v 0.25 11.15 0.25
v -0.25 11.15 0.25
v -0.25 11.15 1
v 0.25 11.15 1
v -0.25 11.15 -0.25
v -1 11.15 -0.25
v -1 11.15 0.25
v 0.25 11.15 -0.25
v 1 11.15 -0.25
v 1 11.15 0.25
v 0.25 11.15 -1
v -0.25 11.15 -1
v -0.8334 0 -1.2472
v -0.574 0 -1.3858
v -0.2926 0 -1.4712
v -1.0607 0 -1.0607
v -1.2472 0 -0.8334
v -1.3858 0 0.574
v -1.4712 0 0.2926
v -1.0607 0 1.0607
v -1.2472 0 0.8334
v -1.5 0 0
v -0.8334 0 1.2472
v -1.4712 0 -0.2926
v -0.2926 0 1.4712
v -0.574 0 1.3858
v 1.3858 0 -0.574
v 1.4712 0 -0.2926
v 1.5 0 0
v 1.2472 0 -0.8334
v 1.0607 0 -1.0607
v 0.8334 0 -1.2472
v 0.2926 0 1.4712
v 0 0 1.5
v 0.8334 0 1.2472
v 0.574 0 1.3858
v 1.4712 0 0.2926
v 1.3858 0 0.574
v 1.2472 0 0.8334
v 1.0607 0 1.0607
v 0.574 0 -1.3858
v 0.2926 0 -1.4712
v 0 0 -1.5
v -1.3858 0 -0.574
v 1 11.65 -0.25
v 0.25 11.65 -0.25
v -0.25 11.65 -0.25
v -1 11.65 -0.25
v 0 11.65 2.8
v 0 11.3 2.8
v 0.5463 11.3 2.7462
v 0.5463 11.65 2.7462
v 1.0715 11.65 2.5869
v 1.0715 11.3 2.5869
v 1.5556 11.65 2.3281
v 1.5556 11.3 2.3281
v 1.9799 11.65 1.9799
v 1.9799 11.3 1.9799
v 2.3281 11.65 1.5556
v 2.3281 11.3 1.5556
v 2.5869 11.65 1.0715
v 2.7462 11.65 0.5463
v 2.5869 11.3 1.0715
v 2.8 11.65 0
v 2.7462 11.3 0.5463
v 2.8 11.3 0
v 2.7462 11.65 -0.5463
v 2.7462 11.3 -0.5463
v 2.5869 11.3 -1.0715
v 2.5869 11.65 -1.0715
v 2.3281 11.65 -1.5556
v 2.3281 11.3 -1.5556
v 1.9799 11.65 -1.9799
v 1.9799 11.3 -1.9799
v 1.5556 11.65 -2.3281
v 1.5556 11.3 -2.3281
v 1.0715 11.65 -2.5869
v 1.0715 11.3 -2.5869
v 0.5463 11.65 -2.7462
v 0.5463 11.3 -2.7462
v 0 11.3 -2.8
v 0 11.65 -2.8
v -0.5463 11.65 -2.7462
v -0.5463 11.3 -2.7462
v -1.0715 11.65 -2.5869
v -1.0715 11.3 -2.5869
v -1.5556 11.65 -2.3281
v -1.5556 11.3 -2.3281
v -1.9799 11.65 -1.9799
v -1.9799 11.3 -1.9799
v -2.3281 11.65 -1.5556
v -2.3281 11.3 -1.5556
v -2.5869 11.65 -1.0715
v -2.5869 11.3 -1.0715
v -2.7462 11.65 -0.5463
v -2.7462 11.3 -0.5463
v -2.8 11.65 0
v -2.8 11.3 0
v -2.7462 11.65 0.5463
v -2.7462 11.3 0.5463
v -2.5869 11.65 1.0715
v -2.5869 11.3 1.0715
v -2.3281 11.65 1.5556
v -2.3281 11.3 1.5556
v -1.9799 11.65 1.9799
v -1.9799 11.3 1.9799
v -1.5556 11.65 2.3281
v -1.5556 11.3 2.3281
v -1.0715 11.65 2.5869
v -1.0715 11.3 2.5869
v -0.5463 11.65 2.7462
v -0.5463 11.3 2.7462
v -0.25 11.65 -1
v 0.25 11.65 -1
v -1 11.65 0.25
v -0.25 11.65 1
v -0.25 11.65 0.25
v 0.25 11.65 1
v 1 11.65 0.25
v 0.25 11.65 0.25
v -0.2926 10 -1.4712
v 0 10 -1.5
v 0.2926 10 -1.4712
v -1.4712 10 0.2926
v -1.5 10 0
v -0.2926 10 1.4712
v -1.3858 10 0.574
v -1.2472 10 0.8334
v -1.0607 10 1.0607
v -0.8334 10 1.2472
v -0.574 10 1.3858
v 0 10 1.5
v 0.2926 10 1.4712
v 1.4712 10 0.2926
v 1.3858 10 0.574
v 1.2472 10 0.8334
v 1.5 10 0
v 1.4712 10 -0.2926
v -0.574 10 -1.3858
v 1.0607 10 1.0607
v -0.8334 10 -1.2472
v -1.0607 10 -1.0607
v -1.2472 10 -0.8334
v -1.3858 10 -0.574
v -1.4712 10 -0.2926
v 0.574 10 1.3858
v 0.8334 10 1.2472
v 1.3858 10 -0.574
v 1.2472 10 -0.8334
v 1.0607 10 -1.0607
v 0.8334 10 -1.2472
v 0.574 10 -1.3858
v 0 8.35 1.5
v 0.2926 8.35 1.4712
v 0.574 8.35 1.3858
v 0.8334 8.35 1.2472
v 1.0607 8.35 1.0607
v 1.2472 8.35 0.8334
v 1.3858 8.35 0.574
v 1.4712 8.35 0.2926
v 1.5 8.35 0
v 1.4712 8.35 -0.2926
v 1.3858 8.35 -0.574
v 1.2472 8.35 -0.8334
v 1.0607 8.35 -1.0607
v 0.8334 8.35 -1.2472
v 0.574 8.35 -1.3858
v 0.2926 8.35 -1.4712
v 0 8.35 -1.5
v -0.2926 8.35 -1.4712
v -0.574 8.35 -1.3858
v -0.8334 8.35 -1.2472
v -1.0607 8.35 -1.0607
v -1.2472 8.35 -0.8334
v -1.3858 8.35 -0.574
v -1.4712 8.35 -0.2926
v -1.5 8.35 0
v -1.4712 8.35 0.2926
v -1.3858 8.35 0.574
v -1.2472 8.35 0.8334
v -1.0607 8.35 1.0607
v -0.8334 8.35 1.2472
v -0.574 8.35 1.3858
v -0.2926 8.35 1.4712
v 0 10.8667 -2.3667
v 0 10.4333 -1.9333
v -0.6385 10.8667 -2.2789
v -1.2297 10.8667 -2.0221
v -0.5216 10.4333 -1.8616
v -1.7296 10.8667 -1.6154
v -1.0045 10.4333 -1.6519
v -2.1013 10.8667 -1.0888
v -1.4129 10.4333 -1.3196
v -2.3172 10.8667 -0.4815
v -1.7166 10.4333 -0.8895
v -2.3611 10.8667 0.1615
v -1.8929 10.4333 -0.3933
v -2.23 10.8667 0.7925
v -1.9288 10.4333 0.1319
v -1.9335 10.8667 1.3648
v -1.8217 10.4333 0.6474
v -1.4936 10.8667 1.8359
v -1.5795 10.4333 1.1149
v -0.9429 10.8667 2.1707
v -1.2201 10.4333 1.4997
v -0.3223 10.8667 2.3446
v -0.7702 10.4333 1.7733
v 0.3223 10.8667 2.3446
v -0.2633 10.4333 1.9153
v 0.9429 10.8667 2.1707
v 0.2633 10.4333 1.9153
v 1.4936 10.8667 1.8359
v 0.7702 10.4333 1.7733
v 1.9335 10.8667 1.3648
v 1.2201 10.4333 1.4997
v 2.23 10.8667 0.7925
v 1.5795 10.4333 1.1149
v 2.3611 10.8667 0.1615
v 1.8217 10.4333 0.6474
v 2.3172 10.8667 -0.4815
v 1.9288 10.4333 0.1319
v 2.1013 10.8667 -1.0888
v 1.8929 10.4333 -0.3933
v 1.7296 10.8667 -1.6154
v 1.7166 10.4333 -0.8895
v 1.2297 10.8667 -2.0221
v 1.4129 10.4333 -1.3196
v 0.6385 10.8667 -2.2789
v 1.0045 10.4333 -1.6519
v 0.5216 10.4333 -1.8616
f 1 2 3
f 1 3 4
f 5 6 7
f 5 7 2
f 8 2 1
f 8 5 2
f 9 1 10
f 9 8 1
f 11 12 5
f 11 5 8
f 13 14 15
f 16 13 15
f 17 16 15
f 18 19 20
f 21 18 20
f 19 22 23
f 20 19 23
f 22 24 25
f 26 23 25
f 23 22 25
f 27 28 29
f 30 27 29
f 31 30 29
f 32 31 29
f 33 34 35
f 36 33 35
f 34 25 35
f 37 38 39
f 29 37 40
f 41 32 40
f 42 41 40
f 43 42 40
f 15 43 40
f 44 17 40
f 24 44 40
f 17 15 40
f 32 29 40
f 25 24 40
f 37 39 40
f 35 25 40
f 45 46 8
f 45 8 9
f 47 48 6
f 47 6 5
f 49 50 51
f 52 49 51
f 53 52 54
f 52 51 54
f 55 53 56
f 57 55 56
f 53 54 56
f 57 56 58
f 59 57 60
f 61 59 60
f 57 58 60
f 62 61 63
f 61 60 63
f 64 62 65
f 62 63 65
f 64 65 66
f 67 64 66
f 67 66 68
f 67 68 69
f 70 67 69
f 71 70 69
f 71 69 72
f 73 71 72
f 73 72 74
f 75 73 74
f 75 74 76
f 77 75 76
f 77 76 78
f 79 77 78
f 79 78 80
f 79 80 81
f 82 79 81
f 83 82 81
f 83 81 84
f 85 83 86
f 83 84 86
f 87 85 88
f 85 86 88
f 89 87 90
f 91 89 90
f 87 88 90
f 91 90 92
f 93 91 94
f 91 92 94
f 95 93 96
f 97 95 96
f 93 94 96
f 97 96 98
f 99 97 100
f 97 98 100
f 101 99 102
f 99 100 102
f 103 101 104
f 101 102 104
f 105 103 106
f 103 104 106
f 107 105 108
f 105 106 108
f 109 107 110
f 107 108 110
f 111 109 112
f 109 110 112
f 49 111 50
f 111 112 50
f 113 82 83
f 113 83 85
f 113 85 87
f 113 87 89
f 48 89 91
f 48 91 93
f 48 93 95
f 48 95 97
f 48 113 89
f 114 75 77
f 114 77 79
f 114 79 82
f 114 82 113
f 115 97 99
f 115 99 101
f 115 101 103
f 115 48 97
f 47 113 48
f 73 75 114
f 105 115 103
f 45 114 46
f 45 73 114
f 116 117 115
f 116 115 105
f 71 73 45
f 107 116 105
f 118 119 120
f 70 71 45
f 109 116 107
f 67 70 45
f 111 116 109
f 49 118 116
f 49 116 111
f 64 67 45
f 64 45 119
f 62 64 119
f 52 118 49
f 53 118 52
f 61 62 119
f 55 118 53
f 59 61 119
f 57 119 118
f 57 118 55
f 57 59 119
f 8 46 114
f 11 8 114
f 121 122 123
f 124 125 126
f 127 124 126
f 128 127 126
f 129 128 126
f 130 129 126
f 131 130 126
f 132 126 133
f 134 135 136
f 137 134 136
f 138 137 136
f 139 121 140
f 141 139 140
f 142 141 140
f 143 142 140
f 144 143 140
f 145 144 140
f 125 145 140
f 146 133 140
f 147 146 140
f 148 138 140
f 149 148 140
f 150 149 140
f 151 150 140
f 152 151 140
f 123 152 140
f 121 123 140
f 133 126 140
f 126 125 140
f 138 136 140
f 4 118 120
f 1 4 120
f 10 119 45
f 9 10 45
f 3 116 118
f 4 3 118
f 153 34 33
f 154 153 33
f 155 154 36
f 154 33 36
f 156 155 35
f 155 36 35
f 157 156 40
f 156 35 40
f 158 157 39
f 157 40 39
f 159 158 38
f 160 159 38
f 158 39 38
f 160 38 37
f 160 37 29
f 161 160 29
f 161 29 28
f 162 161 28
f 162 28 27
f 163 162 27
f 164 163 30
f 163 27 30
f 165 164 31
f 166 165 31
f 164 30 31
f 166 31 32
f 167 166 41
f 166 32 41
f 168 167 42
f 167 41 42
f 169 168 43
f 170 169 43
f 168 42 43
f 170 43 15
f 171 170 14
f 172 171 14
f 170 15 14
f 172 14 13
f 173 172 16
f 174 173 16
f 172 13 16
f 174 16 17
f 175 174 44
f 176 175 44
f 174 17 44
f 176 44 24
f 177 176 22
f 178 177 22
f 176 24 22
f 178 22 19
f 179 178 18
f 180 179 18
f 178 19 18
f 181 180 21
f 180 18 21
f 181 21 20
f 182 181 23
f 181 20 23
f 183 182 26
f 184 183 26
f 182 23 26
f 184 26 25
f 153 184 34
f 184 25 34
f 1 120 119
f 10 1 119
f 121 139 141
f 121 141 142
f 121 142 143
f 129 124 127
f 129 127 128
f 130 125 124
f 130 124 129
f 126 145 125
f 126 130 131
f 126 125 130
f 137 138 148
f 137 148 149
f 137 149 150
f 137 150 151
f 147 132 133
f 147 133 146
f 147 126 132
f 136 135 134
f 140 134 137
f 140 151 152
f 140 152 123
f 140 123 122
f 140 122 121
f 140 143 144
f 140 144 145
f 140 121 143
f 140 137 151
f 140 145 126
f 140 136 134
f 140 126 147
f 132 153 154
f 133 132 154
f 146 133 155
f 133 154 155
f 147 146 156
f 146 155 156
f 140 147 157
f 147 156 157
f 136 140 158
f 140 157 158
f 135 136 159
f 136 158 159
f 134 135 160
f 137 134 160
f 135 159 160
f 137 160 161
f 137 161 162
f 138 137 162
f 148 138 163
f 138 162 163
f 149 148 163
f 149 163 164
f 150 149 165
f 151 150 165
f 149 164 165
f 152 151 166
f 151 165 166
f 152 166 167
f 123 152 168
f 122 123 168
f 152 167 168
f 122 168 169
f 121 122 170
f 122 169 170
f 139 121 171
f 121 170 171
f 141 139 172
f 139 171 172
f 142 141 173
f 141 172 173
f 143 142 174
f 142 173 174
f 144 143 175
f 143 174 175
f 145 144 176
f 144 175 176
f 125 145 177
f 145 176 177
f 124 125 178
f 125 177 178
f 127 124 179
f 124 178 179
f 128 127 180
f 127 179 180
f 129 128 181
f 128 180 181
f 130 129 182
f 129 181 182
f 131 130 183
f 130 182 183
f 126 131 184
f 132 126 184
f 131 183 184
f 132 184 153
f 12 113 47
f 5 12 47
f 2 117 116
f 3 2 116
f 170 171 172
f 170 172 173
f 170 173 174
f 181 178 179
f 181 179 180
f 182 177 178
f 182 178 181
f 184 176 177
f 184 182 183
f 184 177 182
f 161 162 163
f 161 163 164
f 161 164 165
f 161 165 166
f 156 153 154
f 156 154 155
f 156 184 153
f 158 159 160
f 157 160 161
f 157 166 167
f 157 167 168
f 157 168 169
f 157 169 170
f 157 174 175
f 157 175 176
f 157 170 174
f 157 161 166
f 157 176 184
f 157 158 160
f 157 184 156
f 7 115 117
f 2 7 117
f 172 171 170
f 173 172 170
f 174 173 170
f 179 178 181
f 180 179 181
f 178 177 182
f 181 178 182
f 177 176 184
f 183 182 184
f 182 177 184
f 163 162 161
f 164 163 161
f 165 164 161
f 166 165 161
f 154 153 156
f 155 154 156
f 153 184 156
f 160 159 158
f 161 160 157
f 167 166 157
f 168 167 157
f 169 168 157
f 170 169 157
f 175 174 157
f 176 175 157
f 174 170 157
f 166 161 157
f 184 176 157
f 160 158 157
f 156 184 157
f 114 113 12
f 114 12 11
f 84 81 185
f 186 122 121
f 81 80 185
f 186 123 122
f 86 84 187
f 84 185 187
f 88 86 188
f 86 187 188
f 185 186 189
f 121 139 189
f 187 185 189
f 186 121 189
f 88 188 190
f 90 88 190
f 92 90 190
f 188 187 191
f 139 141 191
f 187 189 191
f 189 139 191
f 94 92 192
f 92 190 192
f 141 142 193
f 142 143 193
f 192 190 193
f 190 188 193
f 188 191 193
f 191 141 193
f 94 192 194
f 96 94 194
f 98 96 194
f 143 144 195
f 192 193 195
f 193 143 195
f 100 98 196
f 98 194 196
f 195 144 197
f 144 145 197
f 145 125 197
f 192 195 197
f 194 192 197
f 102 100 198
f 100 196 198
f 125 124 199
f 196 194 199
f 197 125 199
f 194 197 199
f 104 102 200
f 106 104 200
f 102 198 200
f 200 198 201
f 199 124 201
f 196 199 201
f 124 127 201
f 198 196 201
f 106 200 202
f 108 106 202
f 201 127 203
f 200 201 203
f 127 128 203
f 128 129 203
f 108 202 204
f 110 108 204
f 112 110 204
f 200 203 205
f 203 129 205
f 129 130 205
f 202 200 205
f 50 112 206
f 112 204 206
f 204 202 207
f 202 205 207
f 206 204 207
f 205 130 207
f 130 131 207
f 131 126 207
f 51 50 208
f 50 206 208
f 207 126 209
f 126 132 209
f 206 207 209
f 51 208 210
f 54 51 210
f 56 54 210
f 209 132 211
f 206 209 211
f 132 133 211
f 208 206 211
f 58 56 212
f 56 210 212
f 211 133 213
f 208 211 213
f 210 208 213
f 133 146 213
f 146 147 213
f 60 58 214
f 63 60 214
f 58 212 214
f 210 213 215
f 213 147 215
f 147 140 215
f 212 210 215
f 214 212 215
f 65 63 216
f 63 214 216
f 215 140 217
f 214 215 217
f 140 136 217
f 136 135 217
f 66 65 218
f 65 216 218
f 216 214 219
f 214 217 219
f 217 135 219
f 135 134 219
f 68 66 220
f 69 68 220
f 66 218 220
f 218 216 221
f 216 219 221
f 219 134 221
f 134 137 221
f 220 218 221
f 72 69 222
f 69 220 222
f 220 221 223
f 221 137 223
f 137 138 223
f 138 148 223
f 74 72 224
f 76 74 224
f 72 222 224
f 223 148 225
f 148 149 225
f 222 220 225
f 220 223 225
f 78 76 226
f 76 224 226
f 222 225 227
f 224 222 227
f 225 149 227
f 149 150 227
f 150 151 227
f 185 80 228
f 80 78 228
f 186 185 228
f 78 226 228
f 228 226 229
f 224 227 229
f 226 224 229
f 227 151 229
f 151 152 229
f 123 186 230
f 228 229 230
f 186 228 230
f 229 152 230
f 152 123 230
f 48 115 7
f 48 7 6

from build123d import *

# Parameters (mm, degrees)
SKETCH1_R           = 1.5
BOSS_EXTRUDE1_DEPTH = 8.35
SKETCH2_R           = 1.5
BOSS_EXTRUDE2_DEPTH = 1.65
SKETCH3_R           = 2.8
BOSS_EXTRUDE3_DEPTH = 1.65
SKETCH7_W           = 0.5
SKETCH7_H           = 0.75
SKETCH7_H_2         = 0.5
SKETCH7_W_2         = 0.75
CUT_EXTRUDE2_DEPTH  = 0.5


with BuildPart() as part:
    # Sketch1 → Boss-Extrude1 (new body)
    with BuildSketch(Plane(origin=(0, 0, 0), x_dir=(1, 0, 0), z_dir=(0, 1, 0))):
        with Locations(Location((0, 0, 0), (0, 0, 270))):
            Circle(SKETCH1_R)
    extrude(amount=BOSS_EXTRUDE1_DEPTH)


with BuildPart() as body_2:
    # Sketch2 → Boss-Extrude2 (new body)
    with BuildSketch(Plane(origin=(0, 8.35, 0), x_dir=(1, 0, 0), z_dir=(0, 1, 0))):
        with Locations(Location((0, 0, 0), (0, 0, 270))):
            Circle(SKETCH2_R)
    extrude(amount=BOSS_EXTRUDE2_DEPTH)


with BuildPart() as body_3:
    # Sketch3 → Boss-Extrude3 (new body)
    with BuildSketch(Plane(origin=(0, 10, 0), x_dir=(1, 0, 0), z_dir=(0, 1, 0))):
        with Locations(Location((0, 0, 0), (0, 0, 270))):
            Circle(SKETCH3_R)
    extrude(amount=BOSS_EXTRUDE3_DEPTH)

    # Sketch6 → Cut-Revolve1 (revolve, cut)
    with BuildSketch(Plane.XY, mode=Mode.PRIVATE) as cut_revolve1_sk:
        Polygon((1.5, 10), (2.8, 10), (2.8, 11.3), align=None)
    revolve(cut_revolve1_sk.sketch.rotate(Axis((0, 0, 0), (0, 1, 0)), 90), axis=Axis((0, 0, 0), (0, 1, 0)), mode=Mode.SUBTRACT)

    # Sketch7 → Cut-Extrude2 (cut)
    with BuildSketch(Plane(origin=(0, 11.65, 0), x_dir=(1, 0, 0), z_dir=(0, 1, 0))):
        with Locations((0, 0.625)):
            Rectangle(SKETCH7_W, SKETCH7_H)
        Rectangle(SKETCH7_W, SKETCH7_H_2)
        with Locations((0.625, 0)):
            Rectangle(SKETCH7_W_2, SKETCH7_H_2)
        with Locations((0, -0.625)):
            Rectangle(SKETCH7_W, SKETCH7_H)
        with Locations((-0.625, 0)):
            Rectangle(SKETCH7_W_2, SKETCH7_H_2)
    extrude(amount=-CUT_EXTRUDE2_DEPTH, mode=Mode.SUBTRACT)


solid = Compound([part.part, body_2.part, body_3.part])
